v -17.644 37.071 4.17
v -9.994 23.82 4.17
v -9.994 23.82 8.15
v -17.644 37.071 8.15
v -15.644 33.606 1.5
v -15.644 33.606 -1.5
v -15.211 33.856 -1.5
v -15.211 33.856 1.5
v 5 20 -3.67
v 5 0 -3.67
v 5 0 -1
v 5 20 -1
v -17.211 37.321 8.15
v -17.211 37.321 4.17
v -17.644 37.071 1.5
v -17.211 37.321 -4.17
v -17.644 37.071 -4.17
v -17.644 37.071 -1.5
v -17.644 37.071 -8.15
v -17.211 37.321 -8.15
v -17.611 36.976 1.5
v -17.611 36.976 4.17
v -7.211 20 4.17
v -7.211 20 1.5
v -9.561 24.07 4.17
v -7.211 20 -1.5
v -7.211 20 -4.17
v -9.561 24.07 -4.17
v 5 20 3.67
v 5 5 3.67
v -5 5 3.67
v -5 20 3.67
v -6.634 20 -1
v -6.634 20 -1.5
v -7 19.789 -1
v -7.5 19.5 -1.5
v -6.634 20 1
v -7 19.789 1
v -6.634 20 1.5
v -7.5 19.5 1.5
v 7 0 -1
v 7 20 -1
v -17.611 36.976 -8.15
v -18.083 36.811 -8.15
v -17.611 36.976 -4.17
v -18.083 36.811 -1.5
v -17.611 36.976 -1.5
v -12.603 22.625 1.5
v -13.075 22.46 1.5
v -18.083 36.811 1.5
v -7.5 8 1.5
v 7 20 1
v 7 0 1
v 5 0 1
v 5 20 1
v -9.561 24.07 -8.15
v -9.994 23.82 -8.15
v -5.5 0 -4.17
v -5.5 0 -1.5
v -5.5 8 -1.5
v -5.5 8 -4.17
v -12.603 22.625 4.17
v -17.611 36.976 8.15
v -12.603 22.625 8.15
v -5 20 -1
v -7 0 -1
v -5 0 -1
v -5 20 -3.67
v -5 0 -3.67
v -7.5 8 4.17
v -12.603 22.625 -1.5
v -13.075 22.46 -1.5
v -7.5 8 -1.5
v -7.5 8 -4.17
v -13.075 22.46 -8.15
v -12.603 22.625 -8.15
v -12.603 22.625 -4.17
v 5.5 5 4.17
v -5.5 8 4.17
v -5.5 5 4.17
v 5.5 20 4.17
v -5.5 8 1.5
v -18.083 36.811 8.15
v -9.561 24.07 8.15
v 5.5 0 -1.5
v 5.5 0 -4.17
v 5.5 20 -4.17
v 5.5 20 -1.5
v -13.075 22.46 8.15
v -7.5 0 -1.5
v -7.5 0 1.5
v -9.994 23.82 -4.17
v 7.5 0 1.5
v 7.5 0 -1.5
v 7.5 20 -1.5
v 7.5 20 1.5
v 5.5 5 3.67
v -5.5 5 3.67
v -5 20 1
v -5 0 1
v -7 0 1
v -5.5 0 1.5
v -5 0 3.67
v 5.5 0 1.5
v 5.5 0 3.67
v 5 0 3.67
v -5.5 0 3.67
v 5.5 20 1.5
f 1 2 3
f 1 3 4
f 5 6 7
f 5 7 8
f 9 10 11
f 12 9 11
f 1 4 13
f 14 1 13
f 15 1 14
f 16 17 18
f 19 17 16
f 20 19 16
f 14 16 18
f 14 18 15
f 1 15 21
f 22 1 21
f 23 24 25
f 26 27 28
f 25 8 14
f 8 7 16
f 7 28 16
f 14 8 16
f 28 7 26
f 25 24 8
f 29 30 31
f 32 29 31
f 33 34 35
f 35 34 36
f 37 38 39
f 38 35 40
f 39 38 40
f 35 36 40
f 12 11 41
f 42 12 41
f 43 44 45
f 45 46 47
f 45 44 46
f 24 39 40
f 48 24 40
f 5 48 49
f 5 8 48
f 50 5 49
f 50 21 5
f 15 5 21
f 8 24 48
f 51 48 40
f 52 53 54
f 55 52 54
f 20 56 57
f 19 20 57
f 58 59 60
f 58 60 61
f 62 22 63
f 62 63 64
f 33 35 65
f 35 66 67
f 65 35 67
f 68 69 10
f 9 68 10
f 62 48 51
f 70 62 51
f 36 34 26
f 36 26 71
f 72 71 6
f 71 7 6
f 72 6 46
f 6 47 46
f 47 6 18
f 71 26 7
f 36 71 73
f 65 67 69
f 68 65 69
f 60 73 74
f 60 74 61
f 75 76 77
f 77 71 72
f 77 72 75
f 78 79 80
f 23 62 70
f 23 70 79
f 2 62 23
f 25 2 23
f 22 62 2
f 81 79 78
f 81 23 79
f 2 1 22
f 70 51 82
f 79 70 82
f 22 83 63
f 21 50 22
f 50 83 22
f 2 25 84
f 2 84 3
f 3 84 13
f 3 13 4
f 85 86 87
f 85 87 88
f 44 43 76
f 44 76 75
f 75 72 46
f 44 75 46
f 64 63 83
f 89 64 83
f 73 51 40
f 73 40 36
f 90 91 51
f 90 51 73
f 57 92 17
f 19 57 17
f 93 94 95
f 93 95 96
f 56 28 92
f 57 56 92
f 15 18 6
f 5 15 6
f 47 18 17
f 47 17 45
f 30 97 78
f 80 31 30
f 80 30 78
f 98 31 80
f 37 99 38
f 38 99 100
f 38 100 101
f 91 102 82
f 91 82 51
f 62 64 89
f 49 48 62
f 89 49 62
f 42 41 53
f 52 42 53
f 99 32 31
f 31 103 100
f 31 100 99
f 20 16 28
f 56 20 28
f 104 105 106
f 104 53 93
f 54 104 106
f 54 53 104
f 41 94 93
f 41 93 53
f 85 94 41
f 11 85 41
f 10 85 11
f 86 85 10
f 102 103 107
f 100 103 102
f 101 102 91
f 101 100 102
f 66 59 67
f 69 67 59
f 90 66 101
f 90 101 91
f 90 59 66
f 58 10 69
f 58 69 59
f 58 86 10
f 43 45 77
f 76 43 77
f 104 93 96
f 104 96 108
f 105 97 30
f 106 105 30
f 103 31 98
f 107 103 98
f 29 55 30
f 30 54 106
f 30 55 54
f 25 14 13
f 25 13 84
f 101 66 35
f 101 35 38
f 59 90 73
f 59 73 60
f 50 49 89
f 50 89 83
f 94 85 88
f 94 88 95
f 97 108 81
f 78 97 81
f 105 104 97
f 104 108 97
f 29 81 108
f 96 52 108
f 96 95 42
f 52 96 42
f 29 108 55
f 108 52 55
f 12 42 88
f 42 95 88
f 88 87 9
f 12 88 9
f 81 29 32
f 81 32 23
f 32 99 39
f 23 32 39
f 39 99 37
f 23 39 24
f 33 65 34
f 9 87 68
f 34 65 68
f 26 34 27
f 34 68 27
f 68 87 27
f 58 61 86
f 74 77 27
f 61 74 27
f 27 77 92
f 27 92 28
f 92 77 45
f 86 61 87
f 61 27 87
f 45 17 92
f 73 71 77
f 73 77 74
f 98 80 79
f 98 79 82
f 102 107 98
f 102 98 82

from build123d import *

# Parameters (mm, degrees)
AUFSATZ_LINEAR_AUSTRAGEN1_DEPTH  = 20
SCHNITT_LINEAR_AUSTRAGEN2_REACH  = 24.753
SKIZZE8_W                        = 11
SKIZZE8_H                        = 5
AUFSATZ_LINEAR_AUSTRAGEN3_DEPTH  = 8.34
SCHNITT_LINEAR_AUSTRAGEN3_REACH  = 28.626
SKIZZE12_W                       = 1.5
SKIZZE12_H                       = 2
AUFSATZ_LINEAR_AUSTRAGEN4_DEPTH  = 3.98
AUFSATZ_LINEAR_AUSTRAGEN5_DEPTH  = 2.67
AUFSATZ_LINEAR_AUSTRAGEN6_DEPTH  = 2.67
SCHNITT_LINEAR_AUSTRAGEN4_REACH  = 43.942
SKIZZE17_W                       = 3
SKIZZE17_H                       = 16.288675134
AUFSATZ_LINEAR_AUSTRAGEN15_DEPTH = 6.65


with BuildPart() as part:
    # Skizze1 → Aufsatz-Linear austragen1 (new body)
    with BuildSketch(Plane(origin=(0, 0, 0), x_dir=(1, 0, 0), z_dir=(0, 1, 0))):
        Polygon((5.5, -4.17), (-5.5, -4.17), (-5.5, -1.5), (-7.5, -1.5), (-7.5, 1.5), (-5.5, 1.5), (-5.5, 4.17), (5.5, 4.17), (5.5, 1.5), (7.5, 1.5), (7.5, -1.5), (5.5, -1.5), align=None)
        Polygon((-5, 1), (-5, 3.67), (5, 3.67), (5, 1), (7, 1), (7, -1), (5, -1), (5, -3.67), (-5, -3.67), (-5, -1), (-7, -1), (-7, 1), align=None, mode=Mode.SUBTRACT)
    extrude(amount=AUFSATZ_LINEAR_AUSTRAGEN1_DEPTH)

    # Skizze8 → Schnitt-Linear austragen2 (cut, up to next)
    with BuildSketch(Plane(origin=(0, 0, 3.67), x_dir=(-1, 0, 0), z_dir=(0, 0, -1)), mode=Mode.PRIVATE) as schnitt_linear_austragen2_sk1:
        with Locations((0, 2.5)):
            Rectangle(SKIZZE8_W, SKIZZE8_H)
    schnitt_linear_austragen2_tool1 = extrude(schnitt_linear_austragen2_sk1.sketch, amount=-SCHNITT_LINEAR_AUSTRAGEN2_REACH, mode=Mode.PRIVATE) & part.part
    add(schnitt_linear_austragen2_tool1.solids().sort_by_distance((0, 2.5, 3.67))[0], mode=Mode.SUBTRACT)

    # Skizze10 → Aufsatz-Linear austragen3 (add)
    with BuildSketch(Plane(origin=(0, 0, -4.17), x_dir=(-1, 0, 0), z_dir=(0, 0, -1))):
        Polygon((5.5, 20), (7.211324865, 20), (17.211324865, 37.320508076), (17.644337567, 37.070508076), (7.5, 19.5), (5.5, 19.5), align=None)
    extrude(amount=-AUFSATZ_LINEAR_AUSTRAGEN3_DEPTH)

    # Skizze12 → Schnitt-Linear austragen3 (cut, up to next)
    with BuildSketch(Plane.XZ.offset(-19.5), mode=Mode.PRIVATE) as schnitt_linear_austragen3_sk1:
        with Locations((-6.25, 0)):
            Rectangle(SKIZZE12_W, SKIZZE12_H)
    schnitt_linear_austragen3_tool1 = extrude(schnitt_linear_austragen3_sk1.sketch, amount=-SCHNITT_LINEAR_AUSTRAGEN3_REACH, mode=Mode.PRIVATE) & part.part
    add(schnitt_linear_austragen3_tool1.solids().sort_by_distance((-6.25, 19.5, 0))[0], mode=Mode.SUBTRACT)

    # Skizze13 → Aufsatz-Linear austragen4 (add)
    with BuildSketch(Plane(origin=(0, 0, -4.17), x_dir=(-1, 0, 0), z_dir=(0, 0, -1))):
        Polygon((17.211324865, 37.320508076), (9.561324865, 24.070319398), (9.994337567, 23.820319398), (17.644337567, 37.070508076), align=None)
    aufsatz_linear_austragen4 = extrude(amount=AUFSATZ_LINEAR_AUSTRAGEN4_DEPTH)

    # Skizze15 → Aufsatz-Linear austragen5 (add)
    with BuildSketch(Plane(origin=(0, 0, -1.5), x_dir=(-1, 0, 0), z_dir=(0, 0, -1))):
        Polygon((5.5, 8), (5.5, 19.5), (7.5, 19.5), (17.644337567, 37.070508076), (7.5, 8), align=None)
    extrude(amount=AUFSATZ_LINEAR_AUSTRAGEN5_DEPTH)

    # Spiegeln1: Aufsatz-Linear austragen4 across plane
    add(aufsatz_linear_austragen4.mirror(Plane.XY))

    # Skizze16 → Aufsatz-Linear austragen6 (add)
    with BuildSketch(Plane.XY.offset(1.5)):
        Polygon((-17.644337567, 37.070508076), (-7.5, 8), (-5.5, 8), (-5.5, 19.5), (-7.5, 19.5), align=None)
    extrude(amount=AUFSATZ_LINEAR_AUSTRAGEN6_DEPTH)

    # Skizze17 → Schnitt-Linear austragen4 (cut, up to next)
    with BuildSketch(Plane(origin=(2.818747687, 1.627404736, 0), x_dir=(0, 0, 1), z_dir=(-0.8660254037844417, -0.49999999999999467, 0)), mode=Mode.PRIVATE) as schnitt_linear_austragen4_sk1:
        with Locations((0, 28.781832941)):
            Rectangle(SKIZZE17_W, SKIZZE17_H)
    schnitt_linear_austragen4_tool1 = extrude(schnitt_linear_austragen4_sk1.sketch, amount=-SCHNITT_LINEAR_AUSTRAGEN4_REACH, mode=Mode.PRIVATE) & part.part
    add(schnitt_linear_austragen4_tool1.solids().sort_by_distance((-11.572169, 26.553203, 0))[0], mode=Mode.SUBTRACT)

    # Skizze22 → Aufsatz-Linear austragen15 (add)
    with BuildSketch(Plane.XY.offset(-1.5)):
        Polygon((-17.611390326, 36.976091556), (-12.603409607, 22.624780496), (-13.075492208, 22.460044288), (-18.083472926, 36.811355348), align=None)
    aufsatz_linear_austragen15 = extrude(amount=-AUFSATZ_LINEAR_AUSTRAGEN15_DEPTH)

    # Spiegeln2: Aufsatz-Linear austragen15 across plane
    add(aufsatz_linear_austragen15.mirror(Plane.XY))


solid = part.part
